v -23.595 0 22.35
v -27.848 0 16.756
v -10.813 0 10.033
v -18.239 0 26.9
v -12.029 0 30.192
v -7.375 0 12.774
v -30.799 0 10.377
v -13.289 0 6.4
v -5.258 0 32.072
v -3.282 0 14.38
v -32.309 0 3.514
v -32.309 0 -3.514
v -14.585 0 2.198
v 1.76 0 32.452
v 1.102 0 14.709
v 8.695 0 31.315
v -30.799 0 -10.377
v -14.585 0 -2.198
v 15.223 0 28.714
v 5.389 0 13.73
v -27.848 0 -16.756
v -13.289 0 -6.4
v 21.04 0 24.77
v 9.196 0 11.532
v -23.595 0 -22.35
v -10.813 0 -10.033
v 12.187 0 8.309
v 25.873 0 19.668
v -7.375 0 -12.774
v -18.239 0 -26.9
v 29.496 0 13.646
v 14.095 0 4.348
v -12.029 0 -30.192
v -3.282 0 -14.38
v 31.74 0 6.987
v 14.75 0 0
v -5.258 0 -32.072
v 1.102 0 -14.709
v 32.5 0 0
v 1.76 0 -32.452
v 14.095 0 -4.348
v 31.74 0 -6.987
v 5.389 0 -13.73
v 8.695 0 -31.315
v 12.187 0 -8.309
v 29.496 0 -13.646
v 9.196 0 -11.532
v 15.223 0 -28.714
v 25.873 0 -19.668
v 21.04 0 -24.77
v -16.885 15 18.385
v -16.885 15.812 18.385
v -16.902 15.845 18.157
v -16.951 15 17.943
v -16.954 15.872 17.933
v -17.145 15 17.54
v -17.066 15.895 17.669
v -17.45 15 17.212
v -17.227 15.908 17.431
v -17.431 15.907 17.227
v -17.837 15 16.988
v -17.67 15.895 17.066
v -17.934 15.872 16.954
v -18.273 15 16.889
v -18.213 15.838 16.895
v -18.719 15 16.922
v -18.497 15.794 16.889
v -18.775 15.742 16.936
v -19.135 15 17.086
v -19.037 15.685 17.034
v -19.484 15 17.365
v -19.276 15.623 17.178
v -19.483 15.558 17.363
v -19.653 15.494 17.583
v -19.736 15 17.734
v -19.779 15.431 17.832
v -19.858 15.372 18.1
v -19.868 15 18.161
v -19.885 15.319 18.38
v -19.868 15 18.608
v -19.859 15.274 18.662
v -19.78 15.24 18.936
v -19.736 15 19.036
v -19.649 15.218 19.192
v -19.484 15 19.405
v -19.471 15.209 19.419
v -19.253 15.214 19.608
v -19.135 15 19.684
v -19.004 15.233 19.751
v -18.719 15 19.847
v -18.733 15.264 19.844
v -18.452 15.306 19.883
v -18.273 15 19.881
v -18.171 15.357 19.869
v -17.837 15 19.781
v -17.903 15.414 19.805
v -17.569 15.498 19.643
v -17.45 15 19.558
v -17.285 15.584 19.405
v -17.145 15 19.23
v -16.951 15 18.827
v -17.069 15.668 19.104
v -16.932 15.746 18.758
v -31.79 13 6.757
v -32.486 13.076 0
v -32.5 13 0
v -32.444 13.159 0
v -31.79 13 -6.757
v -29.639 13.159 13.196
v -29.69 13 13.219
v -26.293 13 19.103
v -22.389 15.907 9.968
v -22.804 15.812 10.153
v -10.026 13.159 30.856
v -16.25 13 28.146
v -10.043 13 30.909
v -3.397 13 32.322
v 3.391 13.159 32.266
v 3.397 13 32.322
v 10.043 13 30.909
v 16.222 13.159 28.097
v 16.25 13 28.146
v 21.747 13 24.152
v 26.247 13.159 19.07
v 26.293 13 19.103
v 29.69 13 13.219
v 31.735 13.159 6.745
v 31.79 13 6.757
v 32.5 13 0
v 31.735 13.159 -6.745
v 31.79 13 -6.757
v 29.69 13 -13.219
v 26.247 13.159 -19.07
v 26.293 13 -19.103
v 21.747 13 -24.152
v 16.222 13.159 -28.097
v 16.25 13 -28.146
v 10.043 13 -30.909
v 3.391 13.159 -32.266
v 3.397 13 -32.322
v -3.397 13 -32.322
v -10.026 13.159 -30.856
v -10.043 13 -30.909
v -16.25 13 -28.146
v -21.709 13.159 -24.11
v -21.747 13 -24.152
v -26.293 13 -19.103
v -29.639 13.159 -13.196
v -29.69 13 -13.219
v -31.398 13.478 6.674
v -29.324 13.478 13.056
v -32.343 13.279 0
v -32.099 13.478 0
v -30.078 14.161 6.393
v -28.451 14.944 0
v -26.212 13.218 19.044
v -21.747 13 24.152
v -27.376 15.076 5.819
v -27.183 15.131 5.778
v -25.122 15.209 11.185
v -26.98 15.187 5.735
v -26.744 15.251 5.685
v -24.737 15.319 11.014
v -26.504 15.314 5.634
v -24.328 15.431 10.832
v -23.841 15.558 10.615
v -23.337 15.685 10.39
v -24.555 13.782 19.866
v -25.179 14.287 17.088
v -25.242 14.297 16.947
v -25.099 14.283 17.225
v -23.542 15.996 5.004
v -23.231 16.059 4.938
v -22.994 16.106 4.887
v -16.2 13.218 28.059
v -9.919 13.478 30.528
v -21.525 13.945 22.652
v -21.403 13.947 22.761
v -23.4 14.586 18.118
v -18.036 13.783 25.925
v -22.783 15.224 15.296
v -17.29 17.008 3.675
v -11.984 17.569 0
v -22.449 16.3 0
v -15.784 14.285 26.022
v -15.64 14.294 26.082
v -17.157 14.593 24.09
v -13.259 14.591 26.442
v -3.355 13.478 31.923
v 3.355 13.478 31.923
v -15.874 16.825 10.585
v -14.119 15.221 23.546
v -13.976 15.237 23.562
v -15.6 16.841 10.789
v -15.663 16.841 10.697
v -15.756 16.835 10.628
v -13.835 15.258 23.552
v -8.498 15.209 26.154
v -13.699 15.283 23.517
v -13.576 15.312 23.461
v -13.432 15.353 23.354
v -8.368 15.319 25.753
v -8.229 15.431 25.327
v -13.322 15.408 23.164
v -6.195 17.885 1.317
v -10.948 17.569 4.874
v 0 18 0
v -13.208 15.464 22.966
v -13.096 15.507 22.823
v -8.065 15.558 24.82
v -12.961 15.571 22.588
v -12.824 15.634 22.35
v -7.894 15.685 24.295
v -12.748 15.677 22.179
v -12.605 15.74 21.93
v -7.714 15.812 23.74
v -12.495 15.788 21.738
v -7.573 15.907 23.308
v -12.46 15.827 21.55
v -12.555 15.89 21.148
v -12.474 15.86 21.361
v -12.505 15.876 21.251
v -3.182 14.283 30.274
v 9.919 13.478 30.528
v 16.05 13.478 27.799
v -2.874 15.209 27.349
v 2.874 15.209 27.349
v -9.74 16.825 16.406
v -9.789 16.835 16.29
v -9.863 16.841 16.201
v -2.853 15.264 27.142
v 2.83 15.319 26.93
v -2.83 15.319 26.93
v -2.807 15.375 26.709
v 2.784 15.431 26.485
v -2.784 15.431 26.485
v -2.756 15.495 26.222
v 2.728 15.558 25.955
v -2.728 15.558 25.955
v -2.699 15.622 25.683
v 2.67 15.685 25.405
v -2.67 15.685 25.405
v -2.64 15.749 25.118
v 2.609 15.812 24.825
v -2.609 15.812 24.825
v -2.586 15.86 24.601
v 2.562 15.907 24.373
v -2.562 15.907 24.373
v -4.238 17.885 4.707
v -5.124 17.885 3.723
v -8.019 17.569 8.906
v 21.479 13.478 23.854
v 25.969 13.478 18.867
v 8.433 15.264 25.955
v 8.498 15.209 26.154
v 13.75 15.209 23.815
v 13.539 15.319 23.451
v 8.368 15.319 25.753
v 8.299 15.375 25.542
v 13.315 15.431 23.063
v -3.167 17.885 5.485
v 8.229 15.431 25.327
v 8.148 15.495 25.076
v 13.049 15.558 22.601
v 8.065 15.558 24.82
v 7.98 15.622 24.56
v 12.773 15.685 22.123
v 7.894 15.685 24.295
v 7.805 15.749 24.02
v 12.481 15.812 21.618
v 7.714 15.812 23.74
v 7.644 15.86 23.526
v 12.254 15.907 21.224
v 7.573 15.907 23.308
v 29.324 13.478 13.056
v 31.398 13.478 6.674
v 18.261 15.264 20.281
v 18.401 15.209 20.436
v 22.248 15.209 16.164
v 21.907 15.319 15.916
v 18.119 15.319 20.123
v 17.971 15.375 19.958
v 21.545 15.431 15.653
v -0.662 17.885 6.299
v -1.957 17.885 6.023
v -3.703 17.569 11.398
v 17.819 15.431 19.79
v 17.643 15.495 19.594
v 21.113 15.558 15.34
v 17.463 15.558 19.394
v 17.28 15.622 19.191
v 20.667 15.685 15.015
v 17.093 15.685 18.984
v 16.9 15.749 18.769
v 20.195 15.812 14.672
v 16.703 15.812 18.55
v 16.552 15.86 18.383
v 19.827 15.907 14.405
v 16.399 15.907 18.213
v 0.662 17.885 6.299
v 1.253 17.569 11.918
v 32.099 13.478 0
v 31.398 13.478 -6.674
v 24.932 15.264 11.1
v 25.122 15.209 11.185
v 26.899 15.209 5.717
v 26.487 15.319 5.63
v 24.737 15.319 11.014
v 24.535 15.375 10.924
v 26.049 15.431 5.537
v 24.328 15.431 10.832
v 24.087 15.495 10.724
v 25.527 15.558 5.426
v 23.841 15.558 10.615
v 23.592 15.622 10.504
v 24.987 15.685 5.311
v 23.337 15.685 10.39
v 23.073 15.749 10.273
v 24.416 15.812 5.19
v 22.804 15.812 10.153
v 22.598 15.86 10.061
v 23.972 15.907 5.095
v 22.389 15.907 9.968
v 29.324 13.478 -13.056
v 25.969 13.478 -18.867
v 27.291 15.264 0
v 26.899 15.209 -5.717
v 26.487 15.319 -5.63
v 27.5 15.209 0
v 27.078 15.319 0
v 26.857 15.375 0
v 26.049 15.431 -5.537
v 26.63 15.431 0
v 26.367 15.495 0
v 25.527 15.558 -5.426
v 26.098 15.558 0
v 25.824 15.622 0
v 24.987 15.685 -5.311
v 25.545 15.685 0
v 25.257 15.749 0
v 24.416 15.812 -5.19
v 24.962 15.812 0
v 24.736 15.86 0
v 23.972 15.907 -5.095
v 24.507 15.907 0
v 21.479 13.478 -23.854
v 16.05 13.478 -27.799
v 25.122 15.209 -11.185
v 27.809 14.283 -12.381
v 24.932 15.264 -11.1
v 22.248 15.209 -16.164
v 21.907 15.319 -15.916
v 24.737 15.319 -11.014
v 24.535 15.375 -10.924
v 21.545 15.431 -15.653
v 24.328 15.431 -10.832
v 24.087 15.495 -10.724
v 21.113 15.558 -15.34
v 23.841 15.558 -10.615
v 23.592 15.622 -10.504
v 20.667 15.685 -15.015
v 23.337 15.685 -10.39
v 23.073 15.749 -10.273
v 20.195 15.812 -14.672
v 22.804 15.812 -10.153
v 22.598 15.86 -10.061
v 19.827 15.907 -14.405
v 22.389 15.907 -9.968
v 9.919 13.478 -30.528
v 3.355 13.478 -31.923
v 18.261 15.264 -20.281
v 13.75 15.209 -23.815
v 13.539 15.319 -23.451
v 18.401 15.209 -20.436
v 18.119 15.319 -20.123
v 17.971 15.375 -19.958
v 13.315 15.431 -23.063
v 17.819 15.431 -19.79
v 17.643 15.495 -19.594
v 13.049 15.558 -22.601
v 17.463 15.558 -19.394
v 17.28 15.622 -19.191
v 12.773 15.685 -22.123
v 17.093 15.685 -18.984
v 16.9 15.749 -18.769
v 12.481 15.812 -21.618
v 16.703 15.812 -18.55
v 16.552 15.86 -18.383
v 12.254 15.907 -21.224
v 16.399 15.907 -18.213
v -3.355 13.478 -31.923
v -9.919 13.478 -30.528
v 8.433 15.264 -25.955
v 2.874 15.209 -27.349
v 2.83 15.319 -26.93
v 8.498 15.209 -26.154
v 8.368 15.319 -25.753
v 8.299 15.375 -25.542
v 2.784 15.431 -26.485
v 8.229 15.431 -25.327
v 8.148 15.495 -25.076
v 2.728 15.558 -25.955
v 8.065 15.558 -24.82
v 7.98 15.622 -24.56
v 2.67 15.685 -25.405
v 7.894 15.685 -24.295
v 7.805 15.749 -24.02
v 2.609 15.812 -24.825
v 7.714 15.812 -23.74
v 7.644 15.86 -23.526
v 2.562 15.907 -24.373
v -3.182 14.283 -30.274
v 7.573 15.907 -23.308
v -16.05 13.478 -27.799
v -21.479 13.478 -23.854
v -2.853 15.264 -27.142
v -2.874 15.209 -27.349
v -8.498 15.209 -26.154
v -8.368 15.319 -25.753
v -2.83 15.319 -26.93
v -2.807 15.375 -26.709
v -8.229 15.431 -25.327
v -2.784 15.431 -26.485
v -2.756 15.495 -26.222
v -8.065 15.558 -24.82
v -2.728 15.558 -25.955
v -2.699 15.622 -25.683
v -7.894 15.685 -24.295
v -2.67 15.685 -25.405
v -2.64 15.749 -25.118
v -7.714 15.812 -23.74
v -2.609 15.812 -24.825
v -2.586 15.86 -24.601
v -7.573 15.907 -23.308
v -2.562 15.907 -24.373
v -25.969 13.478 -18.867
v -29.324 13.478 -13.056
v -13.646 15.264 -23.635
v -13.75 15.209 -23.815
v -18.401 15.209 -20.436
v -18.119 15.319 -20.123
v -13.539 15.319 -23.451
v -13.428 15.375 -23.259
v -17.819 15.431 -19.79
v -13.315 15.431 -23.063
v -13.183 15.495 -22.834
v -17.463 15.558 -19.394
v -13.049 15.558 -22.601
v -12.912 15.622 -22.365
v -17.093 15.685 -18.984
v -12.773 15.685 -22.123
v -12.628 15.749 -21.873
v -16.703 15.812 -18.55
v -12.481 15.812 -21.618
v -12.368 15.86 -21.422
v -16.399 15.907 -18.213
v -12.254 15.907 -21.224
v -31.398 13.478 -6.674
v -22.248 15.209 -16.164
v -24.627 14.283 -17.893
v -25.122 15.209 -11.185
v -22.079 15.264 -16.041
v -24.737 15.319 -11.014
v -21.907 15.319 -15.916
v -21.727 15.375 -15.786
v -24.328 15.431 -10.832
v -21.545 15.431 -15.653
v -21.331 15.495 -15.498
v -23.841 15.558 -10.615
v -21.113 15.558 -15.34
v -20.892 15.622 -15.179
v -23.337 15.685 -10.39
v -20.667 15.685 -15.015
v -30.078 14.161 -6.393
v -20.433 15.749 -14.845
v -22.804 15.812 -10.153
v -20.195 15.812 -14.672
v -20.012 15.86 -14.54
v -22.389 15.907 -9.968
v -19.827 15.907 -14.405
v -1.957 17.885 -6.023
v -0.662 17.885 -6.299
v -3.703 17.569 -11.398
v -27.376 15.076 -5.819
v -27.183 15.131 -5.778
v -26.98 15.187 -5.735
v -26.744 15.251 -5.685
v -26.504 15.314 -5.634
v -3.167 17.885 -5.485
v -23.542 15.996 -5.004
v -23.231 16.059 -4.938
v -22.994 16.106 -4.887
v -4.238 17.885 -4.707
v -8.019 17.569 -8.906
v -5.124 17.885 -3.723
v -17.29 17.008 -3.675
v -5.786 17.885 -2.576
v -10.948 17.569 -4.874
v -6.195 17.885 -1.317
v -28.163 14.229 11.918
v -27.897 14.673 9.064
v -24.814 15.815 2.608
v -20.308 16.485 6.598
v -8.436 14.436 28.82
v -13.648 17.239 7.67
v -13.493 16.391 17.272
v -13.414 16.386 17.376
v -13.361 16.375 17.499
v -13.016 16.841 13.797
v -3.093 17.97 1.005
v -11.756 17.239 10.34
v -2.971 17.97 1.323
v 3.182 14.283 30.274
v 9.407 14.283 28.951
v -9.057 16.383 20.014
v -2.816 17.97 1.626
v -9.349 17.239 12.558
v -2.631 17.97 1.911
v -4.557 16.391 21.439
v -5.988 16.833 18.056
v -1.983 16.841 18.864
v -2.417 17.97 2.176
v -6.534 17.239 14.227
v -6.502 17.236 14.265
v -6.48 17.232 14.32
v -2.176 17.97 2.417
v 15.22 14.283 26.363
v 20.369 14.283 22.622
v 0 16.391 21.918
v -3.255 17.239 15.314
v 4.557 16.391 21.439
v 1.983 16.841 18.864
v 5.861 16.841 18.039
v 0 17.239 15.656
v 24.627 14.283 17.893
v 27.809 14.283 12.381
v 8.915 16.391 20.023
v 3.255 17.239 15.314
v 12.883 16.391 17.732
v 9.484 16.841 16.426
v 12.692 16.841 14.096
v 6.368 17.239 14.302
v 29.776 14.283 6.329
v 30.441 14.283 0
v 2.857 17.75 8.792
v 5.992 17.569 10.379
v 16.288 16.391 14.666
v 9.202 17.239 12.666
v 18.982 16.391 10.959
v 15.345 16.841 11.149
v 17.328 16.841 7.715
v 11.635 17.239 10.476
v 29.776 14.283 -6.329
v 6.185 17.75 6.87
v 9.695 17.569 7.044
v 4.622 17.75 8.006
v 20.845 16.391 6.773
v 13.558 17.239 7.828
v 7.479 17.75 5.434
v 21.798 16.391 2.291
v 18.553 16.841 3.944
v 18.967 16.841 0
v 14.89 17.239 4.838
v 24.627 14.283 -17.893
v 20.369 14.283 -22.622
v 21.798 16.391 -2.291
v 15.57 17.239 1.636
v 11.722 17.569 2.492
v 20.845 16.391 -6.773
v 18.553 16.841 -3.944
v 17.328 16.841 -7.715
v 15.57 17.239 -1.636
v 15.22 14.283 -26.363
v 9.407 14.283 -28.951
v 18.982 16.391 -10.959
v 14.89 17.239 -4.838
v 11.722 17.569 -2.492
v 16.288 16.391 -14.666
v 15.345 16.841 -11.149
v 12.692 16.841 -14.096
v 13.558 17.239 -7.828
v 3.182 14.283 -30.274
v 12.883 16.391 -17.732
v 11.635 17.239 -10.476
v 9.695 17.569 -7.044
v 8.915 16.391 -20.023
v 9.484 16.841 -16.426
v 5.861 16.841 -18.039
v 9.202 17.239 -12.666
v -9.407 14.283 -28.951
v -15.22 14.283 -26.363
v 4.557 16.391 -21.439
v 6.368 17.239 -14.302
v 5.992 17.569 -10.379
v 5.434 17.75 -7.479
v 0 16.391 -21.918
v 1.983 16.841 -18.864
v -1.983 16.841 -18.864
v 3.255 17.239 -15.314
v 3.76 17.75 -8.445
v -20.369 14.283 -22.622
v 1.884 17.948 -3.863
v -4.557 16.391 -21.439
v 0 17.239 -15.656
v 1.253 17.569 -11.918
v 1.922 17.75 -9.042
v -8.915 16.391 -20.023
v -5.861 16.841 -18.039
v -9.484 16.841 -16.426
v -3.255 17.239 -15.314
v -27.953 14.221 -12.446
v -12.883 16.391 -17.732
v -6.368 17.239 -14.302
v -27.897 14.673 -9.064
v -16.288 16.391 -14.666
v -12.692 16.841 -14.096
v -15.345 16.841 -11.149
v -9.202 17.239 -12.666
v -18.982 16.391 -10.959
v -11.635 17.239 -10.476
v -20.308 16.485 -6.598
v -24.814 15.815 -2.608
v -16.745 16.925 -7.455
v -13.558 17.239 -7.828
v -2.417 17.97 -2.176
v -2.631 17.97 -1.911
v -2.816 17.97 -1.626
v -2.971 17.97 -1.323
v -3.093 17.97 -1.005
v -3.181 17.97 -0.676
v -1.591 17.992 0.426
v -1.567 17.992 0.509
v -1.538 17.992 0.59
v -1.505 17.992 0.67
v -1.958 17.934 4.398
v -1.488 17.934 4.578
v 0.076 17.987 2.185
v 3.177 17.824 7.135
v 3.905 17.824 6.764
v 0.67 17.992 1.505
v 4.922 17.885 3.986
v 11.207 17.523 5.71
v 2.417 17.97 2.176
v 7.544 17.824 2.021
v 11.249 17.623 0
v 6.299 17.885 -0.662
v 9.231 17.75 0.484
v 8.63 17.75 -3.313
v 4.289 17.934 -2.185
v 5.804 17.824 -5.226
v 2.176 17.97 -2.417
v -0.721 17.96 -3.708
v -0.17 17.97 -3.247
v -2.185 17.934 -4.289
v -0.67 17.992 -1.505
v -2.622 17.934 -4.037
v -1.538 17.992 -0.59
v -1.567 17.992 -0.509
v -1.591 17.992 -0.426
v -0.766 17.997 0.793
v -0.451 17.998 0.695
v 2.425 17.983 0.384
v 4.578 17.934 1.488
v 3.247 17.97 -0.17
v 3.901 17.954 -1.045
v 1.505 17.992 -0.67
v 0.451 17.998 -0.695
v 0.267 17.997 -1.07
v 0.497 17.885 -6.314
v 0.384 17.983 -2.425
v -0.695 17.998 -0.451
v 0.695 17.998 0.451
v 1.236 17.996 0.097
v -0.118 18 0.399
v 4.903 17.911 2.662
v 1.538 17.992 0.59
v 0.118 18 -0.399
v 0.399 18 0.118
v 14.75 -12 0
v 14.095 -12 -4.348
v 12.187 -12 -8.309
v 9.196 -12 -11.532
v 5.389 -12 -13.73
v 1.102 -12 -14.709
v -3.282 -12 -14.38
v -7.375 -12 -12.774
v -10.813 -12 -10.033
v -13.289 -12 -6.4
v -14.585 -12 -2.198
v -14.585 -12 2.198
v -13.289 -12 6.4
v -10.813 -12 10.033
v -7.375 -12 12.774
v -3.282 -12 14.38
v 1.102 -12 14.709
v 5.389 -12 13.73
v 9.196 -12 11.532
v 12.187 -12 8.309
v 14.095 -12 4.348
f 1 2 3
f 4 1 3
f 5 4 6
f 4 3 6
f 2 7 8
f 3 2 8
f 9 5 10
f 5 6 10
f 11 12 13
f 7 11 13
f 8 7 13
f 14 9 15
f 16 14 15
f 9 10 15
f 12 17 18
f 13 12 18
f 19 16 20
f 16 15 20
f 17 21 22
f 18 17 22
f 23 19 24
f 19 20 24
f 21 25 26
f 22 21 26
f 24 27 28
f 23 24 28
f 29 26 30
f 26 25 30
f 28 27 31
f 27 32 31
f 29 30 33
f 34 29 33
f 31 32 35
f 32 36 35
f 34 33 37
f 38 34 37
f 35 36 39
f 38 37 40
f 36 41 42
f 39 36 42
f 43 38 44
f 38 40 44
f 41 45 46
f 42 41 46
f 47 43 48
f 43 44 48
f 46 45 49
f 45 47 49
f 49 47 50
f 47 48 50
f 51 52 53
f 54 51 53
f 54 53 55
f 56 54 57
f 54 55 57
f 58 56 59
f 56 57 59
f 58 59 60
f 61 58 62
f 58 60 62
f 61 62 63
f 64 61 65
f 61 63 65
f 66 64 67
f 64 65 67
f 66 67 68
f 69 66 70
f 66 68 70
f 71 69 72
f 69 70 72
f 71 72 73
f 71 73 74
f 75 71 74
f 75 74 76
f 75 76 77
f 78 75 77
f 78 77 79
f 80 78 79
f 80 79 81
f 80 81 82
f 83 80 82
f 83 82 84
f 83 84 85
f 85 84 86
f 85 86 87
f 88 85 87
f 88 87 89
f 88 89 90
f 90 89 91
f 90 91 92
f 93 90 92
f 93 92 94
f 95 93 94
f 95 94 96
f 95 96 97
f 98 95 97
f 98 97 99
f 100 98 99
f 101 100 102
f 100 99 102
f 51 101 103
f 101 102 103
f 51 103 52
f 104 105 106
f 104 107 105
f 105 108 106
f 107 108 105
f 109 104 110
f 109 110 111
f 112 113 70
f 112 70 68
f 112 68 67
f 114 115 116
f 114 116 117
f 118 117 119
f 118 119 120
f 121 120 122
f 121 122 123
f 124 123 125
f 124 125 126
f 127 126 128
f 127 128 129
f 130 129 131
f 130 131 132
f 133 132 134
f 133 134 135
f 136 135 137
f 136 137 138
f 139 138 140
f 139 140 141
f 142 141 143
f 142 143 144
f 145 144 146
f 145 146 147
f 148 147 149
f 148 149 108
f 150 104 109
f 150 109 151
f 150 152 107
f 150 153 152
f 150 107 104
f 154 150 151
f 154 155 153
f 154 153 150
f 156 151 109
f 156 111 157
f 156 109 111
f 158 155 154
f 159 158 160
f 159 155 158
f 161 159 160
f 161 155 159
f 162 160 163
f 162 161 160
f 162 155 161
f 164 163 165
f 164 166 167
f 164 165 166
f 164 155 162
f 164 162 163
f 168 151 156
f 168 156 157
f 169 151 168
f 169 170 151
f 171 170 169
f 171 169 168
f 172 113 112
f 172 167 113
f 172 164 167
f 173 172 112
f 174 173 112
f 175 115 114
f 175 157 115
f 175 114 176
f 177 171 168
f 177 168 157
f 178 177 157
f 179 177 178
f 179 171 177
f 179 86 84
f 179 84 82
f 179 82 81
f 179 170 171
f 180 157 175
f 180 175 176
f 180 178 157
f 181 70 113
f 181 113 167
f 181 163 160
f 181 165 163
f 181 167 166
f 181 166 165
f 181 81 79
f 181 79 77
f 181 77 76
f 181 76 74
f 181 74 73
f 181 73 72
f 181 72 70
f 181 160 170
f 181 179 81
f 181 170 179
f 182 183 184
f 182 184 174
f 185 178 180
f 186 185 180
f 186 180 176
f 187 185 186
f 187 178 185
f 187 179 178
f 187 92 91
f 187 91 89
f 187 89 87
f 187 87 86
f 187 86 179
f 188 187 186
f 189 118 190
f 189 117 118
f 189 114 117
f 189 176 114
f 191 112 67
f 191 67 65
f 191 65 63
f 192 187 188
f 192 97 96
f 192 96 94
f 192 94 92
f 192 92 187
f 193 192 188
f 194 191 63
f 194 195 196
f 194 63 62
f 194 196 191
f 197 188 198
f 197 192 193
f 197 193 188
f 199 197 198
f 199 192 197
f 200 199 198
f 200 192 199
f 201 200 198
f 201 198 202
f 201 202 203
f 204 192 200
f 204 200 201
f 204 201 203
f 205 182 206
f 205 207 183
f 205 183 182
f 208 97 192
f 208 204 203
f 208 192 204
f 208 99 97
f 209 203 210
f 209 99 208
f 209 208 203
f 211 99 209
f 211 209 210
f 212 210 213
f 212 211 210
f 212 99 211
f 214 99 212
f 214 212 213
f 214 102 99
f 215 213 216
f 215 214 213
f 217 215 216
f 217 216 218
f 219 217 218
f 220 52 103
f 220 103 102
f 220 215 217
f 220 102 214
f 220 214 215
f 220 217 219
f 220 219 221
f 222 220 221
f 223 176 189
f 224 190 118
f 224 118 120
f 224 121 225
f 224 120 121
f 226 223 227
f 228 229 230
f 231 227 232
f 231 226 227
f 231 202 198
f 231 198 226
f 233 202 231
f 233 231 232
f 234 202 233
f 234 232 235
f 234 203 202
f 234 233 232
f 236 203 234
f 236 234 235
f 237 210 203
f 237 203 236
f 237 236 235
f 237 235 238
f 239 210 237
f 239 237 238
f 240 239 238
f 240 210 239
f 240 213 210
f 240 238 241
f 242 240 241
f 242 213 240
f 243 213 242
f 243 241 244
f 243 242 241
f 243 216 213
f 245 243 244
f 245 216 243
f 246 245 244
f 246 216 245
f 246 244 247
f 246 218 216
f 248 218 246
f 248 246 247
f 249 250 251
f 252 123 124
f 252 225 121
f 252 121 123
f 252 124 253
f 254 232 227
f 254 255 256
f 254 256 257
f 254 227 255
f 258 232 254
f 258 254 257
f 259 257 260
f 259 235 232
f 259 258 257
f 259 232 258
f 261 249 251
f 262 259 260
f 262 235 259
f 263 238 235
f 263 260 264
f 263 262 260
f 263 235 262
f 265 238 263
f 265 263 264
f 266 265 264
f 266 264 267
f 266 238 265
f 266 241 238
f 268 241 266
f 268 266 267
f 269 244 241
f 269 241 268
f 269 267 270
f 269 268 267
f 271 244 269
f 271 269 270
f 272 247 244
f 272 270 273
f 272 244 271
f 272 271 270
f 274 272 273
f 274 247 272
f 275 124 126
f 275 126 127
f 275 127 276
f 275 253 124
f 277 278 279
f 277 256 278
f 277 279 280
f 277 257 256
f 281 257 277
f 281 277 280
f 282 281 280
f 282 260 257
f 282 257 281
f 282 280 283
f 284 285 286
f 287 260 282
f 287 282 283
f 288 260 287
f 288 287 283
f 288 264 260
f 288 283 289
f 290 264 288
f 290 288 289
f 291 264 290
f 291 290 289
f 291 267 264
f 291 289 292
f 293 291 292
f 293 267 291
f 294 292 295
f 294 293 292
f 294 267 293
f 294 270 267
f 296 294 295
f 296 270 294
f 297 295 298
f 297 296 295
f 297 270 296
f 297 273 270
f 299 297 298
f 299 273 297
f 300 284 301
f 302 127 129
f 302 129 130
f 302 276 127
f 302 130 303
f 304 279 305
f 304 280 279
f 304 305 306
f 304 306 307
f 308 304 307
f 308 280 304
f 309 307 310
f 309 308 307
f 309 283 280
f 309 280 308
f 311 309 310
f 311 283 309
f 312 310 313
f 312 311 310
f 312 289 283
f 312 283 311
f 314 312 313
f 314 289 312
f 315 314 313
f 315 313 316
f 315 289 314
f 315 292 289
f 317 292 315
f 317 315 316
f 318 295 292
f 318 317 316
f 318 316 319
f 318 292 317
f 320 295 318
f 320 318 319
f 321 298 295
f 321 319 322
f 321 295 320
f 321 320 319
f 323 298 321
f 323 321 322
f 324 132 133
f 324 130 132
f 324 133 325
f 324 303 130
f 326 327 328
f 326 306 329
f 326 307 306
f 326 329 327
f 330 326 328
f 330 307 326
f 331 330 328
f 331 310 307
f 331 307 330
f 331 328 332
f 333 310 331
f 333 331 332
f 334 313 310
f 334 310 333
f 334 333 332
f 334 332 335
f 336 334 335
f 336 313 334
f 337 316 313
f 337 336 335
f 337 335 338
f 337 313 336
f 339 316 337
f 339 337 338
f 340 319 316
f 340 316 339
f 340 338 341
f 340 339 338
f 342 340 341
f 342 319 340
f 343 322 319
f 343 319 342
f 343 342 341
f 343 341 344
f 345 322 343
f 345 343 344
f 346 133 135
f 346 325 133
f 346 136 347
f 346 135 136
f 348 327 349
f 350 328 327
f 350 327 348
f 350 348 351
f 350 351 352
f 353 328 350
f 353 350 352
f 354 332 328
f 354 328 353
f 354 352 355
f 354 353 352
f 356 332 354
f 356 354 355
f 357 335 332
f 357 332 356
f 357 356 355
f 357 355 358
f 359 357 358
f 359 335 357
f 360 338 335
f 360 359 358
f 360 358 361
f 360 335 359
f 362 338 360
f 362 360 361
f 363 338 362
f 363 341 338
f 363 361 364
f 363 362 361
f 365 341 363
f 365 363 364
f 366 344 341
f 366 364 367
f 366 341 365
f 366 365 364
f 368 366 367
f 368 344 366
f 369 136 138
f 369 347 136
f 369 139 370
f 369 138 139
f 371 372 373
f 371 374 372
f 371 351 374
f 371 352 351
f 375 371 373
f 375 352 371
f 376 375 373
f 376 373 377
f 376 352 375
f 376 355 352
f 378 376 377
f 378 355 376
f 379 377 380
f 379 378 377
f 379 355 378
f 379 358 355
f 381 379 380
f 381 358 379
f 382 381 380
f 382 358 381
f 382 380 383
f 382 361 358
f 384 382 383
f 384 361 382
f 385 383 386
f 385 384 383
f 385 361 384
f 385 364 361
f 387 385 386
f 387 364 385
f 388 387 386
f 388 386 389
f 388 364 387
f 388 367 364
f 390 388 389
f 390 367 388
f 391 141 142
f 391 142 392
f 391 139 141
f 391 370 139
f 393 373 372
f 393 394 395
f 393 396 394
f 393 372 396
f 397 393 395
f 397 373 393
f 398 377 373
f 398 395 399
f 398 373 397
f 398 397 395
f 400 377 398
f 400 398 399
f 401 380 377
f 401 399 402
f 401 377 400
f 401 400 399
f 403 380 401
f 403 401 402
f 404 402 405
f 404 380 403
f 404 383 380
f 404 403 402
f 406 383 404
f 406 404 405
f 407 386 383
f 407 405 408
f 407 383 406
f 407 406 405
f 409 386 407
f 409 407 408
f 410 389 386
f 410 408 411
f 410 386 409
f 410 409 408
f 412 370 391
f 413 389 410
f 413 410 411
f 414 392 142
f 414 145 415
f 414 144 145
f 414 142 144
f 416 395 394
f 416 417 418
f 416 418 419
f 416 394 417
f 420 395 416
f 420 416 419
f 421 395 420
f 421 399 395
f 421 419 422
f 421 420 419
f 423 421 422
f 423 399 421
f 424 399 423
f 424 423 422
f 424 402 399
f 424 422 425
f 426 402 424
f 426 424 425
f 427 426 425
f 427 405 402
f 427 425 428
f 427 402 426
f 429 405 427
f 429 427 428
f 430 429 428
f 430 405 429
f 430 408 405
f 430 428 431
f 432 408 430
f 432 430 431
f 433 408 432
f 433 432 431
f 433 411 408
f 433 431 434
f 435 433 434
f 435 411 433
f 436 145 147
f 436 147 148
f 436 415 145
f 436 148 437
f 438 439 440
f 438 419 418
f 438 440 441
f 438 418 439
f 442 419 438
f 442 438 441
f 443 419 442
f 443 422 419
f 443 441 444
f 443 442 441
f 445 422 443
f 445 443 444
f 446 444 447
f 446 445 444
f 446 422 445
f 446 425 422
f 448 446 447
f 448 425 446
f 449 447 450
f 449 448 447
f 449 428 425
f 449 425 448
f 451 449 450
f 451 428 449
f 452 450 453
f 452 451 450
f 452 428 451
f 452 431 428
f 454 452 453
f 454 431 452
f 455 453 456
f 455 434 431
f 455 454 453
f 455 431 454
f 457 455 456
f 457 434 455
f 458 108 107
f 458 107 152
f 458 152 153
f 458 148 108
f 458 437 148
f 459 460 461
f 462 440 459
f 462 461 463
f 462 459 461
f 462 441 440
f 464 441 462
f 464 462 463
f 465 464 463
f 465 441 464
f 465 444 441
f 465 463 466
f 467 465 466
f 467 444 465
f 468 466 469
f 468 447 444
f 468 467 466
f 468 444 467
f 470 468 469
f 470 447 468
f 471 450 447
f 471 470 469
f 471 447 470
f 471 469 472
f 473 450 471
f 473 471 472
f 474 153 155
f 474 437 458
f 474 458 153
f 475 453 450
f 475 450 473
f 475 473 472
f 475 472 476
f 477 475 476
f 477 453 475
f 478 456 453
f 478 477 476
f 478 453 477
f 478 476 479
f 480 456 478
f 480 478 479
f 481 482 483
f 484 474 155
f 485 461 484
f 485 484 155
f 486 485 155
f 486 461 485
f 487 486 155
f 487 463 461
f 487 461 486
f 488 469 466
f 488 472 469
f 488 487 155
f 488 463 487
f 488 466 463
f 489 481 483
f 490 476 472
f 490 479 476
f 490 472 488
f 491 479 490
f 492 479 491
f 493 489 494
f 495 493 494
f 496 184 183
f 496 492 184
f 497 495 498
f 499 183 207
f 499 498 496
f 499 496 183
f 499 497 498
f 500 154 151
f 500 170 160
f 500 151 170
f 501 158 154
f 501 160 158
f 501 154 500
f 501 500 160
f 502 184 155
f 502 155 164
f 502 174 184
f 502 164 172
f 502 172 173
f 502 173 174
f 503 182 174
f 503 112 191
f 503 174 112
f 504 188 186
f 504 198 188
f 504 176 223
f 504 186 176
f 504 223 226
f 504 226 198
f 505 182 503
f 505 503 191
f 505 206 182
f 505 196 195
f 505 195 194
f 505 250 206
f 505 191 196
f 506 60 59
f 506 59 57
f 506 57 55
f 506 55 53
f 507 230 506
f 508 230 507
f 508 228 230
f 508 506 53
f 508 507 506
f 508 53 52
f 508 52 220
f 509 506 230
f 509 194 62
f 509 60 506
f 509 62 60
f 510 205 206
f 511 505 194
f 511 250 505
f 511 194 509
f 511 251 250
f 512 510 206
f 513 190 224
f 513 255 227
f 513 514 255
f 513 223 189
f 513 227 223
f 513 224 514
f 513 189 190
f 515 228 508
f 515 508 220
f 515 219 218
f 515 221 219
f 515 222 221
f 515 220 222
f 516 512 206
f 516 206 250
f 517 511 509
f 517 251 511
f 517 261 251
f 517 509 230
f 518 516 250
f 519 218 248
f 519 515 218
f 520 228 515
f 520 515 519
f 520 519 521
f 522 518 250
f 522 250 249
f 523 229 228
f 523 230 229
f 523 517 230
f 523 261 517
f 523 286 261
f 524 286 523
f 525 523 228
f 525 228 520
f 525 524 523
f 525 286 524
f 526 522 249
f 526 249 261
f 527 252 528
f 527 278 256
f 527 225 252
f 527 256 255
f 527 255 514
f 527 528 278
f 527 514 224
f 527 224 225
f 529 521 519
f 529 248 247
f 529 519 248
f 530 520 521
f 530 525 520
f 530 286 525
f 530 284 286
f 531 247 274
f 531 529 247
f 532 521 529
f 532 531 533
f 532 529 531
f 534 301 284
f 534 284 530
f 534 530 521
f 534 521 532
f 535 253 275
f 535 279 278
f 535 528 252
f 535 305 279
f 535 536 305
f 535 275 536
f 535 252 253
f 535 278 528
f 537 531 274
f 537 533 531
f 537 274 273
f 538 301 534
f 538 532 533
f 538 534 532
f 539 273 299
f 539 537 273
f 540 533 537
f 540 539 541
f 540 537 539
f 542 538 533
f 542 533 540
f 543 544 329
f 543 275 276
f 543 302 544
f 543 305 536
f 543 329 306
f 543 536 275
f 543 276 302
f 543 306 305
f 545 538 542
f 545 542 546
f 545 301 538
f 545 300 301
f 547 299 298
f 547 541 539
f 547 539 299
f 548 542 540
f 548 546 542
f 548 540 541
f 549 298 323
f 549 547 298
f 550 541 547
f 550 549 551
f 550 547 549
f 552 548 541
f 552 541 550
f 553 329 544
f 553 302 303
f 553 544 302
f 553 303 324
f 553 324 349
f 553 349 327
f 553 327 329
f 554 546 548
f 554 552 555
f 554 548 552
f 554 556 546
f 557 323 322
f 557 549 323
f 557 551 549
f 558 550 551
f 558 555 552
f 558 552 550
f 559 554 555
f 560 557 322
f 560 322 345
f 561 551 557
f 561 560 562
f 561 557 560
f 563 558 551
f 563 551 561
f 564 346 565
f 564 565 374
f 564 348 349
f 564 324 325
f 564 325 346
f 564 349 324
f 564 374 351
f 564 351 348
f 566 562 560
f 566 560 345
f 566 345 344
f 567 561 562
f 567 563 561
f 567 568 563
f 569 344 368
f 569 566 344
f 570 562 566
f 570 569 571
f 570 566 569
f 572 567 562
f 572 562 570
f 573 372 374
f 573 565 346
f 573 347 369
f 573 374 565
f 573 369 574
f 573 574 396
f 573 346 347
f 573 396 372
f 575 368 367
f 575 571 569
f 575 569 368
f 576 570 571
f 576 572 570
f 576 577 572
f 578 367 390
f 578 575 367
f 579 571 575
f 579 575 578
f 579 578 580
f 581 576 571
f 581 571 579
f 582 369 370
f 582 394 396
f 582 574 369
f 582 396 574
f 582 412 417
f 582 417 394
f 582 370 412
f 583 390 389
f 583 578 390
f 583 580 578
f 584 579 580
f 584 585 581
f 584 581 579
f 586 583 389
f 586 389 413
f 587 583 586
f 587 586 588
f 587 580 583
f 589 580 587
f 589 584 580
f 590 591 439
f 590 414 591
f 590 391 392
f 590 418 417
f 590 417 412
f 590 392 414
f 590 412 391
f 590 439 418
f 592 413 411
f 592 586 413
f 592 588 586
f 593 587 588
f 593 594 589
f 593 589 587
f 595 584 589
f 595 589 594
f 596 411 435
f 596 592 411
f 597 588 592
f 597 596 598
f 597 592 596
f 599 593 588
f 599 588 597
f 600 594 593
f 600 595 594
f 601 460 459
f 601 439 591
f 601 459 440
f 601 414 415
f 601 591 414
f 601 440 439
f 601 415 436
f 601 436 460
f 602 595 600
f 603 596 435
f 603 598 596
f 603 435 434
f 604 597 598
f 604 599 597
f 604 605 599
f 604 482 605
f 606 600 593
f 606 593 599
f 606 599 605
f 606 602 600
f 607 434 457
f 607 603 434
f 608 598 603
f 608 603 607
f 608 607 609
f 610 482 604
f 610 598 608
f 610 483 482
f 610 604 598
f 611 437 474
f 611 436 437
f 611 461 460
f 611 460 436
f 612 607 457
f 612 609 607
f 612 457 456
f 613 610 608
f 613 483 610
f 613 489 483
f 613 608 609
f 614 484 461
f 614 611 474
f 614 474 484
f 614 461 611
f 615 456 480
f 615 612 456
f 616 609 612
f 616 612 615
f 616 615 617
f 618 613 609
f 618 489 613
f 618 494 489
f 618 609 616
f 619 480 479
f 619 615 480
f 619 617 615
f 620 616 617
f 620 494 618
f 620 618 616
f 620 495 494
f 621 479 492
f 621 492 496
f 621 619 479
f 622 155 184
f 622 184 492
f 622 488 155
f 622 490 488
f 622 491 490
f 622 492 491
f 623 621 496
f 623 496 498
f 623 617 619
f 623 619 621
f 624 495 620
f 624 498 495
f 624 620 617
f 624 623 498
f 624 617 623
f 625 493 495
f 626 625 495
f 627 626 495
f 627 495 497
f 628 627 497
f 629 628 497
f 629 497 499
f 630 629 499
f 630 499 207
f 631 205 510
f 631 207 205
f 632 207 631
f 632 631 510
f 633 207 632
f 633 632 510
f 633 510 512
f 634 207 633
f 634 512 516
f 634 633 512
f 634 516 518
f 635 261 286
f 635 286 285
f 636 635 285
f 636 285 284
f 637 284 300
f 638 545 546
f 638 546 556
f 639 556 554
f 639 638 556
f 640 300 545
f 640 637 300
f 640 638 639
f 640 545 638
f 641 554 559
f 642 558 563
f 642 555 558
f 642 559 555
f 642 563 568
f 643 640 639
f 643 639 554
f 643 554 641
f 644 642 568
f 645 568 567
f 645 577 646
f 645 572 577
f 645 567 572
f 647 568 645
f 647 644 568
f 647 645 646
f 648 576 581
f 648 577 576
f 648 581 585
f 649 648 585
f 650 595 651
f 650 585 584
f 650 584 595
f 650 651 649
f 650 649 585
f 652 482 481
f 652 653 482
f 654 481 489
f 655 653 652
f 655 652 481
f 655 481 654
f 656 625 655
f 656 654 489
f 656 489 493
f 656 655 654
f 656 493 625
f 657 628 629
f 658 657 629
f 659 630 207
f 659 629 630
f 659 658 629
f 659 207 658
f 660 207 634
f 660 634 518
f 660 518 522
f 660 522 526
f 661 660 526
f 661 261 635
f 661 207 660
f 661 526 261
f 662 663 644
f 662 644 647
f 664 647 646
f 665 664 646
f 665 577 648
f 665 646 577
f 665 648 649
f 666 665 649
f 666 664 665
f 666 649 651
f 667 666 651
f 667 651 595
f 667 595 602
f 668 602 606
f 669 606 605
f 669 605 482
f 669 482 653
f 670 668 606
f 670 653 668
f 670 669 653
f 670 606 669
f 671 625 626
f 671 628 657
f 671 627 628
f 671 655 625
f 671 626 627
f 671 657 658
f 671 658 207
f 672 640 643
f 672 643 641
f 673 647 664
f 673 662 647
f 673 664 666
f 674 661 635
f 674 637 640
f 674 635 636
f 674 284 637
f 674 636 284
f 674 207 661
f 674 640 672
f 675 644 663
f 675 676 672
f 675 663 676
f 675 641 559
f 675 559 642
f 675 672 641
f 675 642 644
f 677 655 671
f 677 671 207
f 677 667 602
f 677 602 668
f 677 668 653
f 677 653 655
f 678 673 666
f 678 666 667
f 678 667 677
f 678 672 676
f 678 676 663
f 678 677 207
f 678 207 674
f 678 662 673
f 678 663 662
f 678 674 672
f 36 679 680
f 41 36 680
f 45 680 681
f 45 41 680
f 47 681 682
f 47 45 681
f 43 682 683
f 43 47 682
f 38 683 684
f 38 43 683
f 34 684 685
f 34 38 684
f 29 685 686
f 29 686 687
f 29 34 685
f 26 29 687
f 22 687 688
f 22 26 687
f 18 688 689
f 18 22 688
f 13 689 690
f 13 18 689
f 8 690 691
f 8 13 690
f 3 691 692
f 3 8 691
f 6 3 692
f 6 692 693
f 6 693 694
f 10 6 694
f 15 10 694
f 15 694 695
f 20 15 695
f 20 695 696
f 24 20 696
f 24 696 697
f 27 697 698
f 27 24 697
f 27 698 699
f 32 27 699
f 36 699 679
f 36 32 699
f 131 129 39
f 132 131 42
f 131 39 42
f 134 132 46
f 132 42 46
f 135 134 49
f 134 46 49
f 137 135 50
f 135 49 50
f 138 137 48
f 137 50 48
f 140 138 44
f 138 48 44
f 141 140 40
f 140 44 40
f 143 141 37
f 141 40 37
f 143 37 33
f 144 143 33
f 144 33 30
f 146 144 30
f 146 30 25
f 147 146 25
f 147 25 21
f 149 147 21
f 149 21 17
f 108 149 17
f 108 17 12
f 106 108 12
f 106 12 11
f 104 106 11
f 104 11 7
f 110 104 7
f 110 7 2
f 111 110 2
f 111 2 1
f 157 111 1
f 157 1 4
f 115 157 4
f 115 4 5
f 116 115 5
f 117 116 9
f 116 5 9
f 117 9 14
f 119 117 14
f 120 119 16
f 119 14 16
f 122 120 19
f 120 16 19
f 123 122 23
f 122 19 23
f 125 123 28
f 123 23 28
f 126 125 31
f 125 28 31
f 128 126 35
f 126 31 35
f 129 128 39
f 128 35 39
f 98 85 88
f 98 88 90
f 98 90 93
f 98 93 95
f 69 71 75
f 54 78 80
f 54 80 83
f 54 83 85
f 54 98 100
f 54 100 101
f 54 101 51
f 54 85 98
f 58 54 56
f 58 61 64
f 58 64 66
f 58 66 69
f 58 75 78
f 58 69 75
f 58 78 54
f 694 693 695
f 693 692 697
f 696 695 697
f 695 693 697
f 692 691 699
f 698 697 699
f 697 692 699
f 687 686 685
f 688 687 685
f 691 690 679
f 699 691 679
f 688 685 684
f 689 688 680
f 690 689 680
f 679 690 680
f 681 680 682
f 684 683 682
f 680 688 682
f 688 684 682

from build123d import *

# Parameters (mm, degrees)
ESQUISSE1_R             = 32.5
BOSS_EXTRU_1_DEPTH      = 18
ESQUISSE3_R             = 1.5
ENL_V_MAT_EXTRU_1_DEPTH = 3
ESQUISSE4_R             = 14.75
BOSS_EXTRU_3_DEPTH      = 12


with BuildPart() as part:
    # Esquisse1 → Boss.-Extru.1 (new body)
    with BuildSketch(Plane(origin=(0, 0, 0), x_dir=(1, 0, 0), z_dir=(0, 1, 0))):
        Circle(ESQUISSE1_R)
    extrude(amount=BOSS_EXTRU_1_DEPTH)

    # Esquisse2 → Enlèvement de matière-Révolution1 (revolve, cut)
    with BuildSketch(Plane.XY):
        with BuildLine():
            Line((-32.5, 13), (-32.5, 19))
            Line((-32.5, 19), (0, 19))
            Line((0, 19), (0, 18))
            add(Edge.make_bspline(
                [(-32.5, 13), (-32.5, 14.172258114), (-21.601405785, 18), (0, 18)],
                knots=[0, 0, 0, 0, 1, 1, 1, 1], degree=3))
        make_face()
    revolve(axis=Axis((0, 0, 0), (0, 1, 0)), mode=Mode.SUBTRACT)

    # Esquisse3 → Enlèv. mat.-Extru.1 (cut)
    with BuildSketch(Plane(origin=(0, 18, 0), x_dir=(1, 0, 0), z_dir=(0, 1, 0))):
        with Locations((-18.384776311, -18.384776311)):
            Circle(ESQUISSE3_R)
    extrude(amount=-ENL_V_MAT_EXTRU_1_DEPTH, mode=Mode.SUBTRACT)

    # Esquisse4 → Boss.-Extru.3 (add)
    with BuildSketch(Plane(origin=(0, 0, 0), x_dir=(1, 0, 0), z_dir=(0, 1, 0))):
        Circle(ESQUISSE4_R)
    extrude(amount=-BOSS_EXTRU_3_DEPTH)


solid = part.part
